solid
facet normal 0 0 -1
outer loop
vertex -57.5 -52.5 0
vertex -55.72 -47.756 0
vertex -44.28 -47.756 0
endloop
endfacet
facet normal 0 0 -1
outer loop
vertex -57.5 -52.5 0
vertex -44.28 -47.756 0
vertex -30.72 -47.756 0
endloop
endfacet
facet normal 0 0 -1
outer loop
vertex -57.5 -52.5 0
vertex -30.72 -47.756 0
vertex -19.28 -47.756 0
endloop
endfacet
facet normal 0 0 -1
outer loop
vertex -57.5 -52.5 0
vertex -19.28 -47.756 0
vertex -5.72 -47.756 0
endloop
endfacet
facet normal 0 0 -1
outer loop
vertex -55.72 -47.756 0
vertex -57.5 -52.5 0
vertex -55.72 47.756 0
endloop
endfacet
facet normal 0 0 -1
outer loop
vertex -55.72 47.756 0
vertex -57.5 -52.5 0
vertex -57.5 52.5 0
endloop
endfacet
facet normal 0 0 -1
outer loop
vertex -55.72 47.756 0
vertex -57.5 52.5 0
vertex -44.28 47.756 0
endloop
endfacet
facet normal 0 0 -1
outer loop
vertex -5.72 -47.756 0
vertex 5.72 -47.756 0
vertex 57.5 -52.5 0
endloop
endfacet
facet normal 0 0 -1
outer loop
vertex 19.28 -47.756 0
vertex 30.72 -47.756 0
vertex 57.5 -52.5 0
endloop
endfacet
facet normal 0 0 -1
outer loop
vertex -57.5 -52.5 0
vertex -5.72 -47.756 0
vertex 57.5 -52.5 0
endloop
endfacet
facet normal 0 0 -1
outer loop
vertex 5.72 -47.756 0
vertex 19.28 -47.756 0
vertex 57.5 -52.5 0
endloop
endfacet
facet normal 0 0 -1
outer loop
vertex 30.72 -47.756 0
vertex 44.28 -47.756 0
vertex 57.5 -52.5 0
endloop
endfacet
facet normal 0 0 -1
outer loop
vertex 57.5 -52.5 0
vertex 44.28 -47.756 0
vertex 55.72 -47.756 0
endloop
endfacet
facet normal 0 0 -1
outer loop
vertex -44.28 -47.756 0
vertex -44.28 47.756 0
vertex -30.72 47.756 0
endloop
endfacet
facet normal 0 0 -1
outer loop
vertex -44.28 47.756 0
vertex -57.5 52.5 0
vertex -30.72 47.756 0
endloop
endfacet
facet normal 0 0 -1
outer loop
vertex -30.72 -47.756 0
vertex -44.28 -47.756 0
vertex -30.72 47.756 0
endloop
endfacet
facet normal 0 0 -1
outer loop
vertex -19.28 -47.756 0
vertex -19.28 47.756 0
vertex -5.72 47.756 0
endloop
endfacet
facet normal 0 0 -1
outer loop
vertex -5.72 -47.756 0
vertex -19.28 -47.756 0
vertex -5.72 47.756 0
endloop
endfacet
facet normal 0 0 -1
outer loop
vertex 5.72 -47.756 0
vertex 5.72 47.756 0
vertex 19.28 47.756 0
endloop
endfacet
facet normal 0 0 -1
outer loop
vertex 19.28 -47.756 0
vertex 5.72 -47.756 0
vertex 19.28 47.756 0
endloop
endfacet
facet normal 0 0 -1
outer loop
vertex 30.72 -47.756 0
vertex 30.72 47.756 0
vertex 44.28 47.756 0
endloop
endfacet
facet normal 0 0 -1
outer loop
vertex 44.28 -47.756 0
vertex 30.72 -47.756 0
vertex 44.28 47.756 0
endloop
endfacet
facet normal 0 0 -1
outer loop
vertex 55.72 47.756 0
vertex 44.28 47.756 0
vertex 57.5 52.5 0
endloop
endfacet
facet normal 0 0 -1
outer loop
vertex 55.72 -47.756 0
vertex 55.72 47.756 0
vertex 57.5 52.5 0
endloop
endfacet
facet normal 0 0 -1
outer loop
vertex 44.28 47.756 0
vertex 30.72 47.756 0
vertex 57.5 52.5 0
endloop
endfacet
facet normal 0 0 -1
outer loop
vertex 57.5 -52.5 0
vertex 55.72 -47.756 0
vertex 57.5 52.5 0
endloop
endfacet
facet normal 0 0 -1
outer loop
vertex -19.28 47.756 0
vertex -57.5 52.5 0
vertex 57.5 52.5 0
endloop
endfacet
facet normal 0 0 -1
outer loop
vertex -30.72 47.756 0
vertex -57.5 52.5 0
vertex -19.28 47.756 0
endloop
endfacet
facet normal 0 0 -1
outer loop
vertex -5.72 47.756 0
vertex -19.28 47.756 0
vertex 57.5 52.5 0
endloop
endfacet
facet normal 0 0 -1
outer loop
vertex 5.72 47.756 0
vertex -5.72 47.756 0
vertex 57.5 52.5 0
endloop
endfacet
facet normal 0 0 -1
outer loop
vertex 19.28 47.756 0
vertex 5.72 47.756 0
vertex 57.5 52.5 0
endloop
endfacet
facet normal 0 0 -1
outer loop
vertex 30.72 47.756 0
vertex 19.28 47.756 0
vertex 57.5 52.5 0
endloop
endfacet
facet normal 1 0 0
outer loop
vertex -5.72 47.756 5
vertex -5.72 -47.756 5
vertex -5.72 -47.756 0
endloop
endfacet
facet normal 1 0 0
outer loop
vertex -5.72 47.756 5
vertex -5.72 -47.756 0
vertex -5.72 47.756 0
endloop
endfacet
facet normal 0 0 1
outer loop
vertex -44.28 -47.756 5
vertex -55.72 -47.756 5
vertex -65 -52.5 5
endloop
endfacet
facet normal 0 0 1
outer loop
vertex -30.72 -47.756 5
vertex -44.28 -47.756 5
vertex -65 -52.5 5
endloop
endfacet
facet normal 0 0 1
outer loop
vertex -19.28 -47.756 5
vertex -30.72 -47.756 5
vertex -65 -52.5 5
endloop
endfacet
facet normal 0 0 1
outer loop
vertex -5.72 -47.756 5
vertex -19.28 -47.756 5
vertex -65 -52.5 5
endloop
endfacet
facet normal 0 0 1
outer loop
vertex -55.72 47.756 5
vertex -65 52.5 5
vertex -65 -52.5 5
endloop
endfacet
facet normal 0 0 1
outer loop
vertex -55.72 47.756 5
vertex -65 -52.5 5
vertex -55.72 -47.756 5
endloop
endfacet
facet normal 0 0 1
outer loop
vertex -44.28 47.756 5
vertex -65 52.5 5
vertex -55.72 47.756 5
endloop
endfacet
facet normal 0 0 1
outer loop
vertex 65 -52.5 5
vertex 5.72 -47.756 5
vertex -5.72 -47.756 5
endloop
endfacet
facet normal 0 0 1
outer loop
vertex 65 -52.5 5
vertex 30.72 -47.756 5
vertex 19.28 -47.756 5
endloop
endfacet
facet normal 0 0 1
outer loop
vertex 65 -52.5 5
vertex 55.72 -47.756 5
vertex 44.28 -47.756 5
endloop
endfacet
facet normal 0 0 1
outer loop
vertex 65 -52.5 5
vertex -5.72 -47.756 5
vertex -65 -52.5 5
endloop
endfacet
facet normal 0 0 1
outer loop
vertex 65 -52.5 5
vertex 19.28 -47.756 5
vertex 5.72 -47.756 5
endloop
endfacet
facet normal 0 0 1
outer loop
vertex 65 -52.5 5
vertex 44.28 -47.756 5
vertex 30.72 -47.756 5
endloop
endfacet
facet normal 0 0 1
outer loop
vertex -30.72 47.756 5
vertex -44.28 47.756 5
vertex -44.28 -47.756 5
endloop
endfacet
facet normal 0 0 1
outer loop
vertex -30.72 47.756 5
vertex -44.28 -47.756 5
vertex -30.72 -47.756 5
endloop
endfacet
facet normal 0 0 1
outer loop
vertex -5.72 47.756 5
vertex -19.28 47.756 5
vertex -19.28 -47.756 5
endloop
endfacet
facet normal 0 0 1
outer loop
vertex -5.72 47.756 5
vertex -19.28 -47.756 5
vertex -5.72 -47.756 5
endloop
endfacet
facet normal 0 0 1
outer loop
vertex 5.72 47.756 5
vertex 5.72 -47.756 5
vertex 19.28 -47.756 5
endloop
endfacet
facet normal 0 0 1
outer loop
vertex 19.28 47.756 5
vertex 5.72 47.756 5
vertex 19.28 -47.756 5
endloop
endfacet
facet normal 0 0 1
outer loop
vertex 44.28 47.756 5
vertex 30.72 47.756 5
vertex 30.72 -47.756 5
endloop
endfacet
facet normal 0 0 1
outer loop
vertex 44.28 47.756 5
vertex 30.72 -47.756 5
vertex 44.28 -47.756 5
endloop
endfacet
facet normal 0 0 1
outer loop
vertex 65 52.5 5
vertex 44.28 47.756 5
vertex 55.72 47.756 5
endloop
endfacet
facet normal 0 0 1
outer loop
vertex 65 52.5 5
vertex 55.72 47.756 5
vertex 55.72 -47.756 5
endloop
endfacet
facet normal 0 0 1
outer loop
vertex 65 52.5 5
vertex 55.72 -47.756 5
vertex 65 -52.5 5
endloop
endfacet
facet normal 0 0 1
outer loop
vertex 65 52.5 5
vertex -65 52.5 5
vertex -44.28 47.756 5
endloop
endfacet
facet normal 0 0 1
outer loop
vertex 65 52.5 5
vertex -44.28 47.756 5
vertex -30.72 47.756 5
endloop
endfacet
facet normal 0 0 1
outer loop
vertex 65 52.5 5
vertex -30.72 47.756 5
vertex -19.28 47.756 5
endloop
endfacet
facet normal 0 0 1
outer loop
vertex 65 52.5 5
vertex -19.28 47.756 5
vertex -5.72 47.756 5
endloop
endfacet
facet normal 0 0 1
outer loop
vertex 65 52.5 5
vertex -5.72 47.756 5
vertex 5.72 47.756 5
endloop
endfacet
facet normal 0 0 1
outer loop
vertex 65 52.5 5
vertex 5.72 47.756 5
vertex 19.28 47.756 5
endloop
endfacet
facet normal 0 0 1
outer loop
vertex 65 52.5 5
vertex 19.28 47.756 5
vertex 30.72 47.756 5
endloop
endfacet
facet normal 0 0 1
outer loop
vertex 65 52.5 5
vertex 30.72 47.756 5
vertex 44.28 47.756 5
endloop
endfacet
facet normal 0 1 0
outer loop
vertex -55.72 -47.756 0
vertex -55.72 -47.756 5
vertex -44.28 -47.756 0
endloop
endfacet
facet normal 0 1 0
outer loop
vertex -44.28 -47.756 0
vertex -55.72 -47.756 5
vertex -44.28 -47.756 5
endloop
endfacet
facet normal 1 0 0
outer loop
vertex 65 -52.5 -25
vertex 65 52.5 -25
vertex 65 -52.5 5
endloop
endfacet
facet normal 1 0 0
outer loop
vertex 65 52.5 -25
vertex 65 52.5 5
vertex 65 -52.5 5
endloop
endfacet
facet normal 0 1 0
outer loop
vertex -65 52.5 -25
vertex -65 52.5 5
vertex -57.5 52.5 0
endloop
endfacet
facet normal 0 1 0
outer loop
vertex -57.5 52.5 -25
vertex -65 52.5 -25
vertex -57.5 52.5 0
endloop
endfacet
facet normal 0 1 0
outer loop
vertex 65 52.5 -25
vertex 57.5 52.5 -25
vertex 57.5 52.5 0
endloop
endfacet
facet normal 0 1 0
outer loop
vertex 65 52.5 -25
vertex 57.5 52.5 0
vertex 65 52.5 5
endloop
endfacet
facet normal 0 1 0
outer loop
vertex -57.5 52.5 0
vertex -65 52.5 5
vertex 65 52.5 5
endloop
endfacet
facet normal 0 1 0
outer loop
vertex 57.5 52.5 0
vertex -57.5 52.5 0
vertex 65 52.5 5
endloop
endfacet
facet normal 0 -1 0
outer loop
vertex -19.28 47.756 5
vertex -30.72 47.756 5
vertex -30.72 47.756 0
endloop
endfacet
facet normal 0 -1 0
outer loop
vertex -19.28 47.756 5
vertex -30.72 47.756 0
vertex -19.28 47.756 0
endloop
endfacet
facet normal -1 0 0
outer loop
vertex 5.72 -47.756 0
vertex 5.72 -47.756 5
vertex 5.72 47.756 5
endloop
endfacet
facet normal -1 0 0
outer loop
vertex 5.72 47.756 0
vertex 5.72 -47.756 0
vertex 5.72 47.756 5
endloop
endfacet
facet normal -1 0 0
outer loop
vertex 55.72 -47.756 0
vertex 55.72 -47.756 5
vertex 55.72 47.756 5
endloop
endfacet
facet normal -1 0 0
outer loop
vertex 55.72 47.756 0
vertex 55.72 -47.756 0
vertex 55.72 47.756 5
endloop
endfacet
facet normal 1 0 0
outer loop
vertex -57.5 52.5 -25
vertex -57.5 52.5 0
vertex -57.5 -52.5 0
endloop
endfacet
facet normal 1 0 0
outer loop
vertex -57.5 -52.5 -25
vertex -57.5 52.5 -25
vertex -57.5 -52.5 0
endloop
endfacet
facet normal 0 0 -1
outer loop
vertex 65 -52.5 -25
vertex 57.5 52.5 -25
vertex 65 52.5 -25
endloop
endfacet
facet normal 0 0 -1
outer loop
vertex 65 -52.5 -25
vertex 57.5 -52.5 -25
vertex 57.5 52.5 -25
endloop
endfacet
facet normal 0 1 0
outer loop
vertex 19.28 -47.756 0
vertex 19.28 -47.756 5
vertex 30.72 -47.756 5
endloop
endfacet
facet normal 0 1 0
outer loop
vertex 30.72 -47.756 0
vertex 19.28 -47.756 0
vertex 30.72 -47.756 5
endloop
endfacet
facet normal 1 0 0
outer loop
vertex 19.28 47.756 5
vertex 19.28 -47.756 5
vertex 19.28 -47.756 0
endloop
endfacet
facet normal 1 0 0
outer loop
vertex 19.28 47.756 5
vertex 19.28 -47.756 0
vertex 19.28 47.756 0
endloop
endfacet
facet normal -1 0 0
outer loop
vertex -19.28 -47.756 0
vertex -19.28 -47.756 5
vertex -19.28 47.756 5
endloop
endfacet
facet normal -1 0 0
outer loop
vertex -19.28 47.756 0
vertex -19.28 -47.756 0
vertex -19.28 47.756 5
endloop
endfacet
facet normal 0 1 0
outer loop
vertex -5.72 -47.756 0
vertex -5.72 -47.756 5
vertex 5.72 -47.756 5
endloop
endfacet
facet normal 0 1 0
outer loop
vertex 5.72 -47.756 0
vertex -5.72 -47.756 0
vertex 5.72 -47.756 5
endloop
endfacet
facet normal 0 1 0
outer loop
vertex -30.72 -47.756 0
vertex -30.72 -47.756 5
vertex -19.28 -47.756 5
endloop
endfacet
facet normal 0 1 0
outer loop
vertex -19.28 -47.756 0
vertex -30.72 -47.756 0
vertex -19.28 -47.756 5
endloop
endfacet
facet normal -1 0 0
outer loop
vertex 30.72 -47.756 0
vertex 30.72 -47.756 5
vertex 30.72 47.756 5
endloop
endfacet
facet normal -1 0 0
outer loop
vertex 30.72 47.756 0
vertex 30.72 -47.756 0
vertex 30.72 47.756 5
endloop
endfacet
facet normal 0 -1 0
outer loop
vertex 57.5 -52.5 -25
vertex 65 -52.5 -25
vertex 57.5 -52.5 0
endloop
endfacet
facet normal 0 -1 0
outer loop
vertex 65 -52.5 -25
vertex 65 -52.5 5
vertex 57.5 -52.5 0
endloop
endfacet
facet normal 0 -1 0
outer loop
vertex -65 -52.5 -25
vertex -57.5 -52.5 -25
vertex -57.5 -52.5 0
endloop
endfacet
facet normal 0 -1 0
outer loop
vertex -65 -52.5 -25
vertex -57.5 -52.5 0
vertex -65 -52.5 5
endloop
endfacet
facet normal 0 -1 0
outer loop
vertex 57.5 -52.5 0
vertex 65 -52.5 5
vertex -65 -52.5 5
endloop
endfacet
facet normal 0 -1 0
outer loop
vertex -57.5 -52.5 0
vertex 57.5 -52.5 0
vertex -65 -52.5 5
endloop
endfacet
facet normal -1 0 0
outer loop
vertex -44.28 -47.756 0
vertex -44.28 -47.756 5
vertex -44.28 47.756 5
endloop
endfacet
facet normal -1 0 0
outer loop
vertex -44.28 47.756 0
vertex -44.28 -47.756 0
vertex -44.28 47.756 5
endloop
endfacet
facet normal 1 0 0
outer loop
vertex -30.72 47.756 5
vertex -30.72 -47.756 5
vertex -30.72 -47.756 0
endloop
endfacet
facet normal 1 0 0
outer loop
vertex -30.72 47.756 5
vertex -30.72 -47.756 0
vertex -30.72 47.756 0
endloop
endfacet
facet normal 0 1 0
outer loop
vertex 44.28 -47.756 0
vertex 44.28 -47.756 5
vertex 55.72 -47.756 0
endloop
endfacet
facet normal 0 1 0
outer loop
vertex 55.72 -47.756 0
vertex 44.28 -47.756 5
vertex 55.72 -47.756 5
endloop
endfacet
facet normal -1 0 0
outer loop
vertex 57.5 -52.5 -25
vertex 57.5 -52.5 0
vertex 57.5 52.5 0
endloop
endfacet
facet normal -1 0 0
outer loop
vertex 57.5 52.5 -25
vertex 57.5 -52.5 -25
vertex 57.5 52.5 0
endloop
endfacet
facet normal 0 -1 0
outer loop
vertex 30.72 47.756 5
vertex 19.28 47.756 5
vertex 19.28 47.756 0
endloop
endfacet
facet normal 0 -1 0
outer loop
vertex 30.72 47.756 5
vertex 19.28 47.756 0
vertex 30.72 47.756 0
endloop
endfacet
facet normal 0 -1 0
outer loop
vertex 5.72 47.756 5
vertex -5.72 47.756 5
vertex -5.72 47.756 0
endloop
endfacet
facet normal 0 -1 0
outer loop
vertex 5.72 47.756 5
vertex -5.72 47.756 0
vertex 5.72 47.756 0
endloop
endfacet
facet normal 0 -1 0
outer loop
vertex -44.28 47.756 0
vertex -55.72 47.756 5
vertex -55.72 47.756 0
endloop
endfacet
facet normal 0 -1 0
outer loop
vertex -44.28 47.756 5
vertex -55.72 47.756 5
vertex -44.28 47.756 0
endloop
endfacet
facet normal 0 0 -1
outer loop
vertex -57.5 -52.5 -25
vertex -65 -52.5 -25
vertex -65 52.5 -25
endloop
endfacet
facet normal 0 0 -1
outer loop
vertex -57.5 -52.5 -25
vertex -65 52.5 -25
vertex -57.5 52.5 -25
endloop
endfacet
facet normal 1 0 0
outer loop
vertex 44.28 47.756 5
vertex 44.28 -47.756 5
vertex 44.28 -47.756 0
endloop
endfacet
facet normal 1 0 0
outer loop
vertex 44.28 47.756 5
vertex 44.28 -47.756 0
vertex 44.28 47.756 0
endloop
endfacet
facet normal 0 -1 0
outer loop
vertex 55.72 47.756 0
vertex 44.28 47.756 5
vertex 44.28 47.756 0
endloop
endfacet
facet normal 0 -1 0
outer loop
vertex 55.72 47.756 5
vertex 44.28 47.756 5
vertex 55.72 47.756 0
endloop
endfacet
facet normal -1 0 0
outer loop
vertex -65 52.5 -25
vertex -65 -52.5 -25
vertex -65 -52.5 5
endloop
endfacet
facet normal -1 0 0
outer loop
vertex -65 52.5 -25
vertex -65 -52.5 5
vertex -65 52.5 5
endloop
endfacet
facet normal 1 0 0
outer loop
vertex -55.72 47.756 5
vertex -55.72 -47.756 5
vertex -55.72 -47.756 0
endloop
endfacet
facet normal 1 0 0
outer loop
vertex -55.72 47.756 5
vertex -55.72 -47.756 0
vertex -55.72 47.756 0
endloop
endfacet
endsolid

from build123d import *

# Parameters (mm, degrees)
F0_W     = 130
F0_H     = 105
F1_DEPTH = 5
F4_DEPTH = 25
F5_W     = 11.439742
F5_H     = 95.512622
F6_DEPTH = 25


with BuildPart() as f1:
    # F0 (on Top) → F1 (new body)
    with BuildSketch(Plane.XY):
        Rectangle(F0_W, F0_H)
    extrude(amount=F1_DEPTH)

    # F3 (on face) → F4 (join)
    with BuildSketch(Plane(origin=(0, 0, 0), x_dir=(1, 0, 0), z_dir=(0, 0, -1))):
        Polygon((57.5, 33.844031), (57.5, -33.844031), (57.5, -52.5), (65, -52.5), (65, 52.5), (57.5, 52.5), align=None)
        Polygon((-57.5, -52.5), (-57.5, -33.844031), (-57.5, 33.844031), (-57.5, 52.5), (-65, 52.5), (-65, -52.5), align=None)
    extrude(amount=F4_DEPTH)

    # F5 (on face) → F6 (cut)
    with BuildSketch(Plane.XY.offset(5)):
        Rectangle(F5_W, F5_H)
        with Locations((25, 0)):
            Rectangle(F5_W, F5_H)
        with Locations((50, 0)):
            Rectangle(F5_W, F5_H)
        with Locations((-25, 0)):
            Rectangle(F5_W, F5_H)
        with Locations((-50, 0)):
            Rectangle(F5_W, F5_H)
    extrude(amount=-F6_DEPTH, mode=Mode.SUBTRACT)


solid = f1.part
